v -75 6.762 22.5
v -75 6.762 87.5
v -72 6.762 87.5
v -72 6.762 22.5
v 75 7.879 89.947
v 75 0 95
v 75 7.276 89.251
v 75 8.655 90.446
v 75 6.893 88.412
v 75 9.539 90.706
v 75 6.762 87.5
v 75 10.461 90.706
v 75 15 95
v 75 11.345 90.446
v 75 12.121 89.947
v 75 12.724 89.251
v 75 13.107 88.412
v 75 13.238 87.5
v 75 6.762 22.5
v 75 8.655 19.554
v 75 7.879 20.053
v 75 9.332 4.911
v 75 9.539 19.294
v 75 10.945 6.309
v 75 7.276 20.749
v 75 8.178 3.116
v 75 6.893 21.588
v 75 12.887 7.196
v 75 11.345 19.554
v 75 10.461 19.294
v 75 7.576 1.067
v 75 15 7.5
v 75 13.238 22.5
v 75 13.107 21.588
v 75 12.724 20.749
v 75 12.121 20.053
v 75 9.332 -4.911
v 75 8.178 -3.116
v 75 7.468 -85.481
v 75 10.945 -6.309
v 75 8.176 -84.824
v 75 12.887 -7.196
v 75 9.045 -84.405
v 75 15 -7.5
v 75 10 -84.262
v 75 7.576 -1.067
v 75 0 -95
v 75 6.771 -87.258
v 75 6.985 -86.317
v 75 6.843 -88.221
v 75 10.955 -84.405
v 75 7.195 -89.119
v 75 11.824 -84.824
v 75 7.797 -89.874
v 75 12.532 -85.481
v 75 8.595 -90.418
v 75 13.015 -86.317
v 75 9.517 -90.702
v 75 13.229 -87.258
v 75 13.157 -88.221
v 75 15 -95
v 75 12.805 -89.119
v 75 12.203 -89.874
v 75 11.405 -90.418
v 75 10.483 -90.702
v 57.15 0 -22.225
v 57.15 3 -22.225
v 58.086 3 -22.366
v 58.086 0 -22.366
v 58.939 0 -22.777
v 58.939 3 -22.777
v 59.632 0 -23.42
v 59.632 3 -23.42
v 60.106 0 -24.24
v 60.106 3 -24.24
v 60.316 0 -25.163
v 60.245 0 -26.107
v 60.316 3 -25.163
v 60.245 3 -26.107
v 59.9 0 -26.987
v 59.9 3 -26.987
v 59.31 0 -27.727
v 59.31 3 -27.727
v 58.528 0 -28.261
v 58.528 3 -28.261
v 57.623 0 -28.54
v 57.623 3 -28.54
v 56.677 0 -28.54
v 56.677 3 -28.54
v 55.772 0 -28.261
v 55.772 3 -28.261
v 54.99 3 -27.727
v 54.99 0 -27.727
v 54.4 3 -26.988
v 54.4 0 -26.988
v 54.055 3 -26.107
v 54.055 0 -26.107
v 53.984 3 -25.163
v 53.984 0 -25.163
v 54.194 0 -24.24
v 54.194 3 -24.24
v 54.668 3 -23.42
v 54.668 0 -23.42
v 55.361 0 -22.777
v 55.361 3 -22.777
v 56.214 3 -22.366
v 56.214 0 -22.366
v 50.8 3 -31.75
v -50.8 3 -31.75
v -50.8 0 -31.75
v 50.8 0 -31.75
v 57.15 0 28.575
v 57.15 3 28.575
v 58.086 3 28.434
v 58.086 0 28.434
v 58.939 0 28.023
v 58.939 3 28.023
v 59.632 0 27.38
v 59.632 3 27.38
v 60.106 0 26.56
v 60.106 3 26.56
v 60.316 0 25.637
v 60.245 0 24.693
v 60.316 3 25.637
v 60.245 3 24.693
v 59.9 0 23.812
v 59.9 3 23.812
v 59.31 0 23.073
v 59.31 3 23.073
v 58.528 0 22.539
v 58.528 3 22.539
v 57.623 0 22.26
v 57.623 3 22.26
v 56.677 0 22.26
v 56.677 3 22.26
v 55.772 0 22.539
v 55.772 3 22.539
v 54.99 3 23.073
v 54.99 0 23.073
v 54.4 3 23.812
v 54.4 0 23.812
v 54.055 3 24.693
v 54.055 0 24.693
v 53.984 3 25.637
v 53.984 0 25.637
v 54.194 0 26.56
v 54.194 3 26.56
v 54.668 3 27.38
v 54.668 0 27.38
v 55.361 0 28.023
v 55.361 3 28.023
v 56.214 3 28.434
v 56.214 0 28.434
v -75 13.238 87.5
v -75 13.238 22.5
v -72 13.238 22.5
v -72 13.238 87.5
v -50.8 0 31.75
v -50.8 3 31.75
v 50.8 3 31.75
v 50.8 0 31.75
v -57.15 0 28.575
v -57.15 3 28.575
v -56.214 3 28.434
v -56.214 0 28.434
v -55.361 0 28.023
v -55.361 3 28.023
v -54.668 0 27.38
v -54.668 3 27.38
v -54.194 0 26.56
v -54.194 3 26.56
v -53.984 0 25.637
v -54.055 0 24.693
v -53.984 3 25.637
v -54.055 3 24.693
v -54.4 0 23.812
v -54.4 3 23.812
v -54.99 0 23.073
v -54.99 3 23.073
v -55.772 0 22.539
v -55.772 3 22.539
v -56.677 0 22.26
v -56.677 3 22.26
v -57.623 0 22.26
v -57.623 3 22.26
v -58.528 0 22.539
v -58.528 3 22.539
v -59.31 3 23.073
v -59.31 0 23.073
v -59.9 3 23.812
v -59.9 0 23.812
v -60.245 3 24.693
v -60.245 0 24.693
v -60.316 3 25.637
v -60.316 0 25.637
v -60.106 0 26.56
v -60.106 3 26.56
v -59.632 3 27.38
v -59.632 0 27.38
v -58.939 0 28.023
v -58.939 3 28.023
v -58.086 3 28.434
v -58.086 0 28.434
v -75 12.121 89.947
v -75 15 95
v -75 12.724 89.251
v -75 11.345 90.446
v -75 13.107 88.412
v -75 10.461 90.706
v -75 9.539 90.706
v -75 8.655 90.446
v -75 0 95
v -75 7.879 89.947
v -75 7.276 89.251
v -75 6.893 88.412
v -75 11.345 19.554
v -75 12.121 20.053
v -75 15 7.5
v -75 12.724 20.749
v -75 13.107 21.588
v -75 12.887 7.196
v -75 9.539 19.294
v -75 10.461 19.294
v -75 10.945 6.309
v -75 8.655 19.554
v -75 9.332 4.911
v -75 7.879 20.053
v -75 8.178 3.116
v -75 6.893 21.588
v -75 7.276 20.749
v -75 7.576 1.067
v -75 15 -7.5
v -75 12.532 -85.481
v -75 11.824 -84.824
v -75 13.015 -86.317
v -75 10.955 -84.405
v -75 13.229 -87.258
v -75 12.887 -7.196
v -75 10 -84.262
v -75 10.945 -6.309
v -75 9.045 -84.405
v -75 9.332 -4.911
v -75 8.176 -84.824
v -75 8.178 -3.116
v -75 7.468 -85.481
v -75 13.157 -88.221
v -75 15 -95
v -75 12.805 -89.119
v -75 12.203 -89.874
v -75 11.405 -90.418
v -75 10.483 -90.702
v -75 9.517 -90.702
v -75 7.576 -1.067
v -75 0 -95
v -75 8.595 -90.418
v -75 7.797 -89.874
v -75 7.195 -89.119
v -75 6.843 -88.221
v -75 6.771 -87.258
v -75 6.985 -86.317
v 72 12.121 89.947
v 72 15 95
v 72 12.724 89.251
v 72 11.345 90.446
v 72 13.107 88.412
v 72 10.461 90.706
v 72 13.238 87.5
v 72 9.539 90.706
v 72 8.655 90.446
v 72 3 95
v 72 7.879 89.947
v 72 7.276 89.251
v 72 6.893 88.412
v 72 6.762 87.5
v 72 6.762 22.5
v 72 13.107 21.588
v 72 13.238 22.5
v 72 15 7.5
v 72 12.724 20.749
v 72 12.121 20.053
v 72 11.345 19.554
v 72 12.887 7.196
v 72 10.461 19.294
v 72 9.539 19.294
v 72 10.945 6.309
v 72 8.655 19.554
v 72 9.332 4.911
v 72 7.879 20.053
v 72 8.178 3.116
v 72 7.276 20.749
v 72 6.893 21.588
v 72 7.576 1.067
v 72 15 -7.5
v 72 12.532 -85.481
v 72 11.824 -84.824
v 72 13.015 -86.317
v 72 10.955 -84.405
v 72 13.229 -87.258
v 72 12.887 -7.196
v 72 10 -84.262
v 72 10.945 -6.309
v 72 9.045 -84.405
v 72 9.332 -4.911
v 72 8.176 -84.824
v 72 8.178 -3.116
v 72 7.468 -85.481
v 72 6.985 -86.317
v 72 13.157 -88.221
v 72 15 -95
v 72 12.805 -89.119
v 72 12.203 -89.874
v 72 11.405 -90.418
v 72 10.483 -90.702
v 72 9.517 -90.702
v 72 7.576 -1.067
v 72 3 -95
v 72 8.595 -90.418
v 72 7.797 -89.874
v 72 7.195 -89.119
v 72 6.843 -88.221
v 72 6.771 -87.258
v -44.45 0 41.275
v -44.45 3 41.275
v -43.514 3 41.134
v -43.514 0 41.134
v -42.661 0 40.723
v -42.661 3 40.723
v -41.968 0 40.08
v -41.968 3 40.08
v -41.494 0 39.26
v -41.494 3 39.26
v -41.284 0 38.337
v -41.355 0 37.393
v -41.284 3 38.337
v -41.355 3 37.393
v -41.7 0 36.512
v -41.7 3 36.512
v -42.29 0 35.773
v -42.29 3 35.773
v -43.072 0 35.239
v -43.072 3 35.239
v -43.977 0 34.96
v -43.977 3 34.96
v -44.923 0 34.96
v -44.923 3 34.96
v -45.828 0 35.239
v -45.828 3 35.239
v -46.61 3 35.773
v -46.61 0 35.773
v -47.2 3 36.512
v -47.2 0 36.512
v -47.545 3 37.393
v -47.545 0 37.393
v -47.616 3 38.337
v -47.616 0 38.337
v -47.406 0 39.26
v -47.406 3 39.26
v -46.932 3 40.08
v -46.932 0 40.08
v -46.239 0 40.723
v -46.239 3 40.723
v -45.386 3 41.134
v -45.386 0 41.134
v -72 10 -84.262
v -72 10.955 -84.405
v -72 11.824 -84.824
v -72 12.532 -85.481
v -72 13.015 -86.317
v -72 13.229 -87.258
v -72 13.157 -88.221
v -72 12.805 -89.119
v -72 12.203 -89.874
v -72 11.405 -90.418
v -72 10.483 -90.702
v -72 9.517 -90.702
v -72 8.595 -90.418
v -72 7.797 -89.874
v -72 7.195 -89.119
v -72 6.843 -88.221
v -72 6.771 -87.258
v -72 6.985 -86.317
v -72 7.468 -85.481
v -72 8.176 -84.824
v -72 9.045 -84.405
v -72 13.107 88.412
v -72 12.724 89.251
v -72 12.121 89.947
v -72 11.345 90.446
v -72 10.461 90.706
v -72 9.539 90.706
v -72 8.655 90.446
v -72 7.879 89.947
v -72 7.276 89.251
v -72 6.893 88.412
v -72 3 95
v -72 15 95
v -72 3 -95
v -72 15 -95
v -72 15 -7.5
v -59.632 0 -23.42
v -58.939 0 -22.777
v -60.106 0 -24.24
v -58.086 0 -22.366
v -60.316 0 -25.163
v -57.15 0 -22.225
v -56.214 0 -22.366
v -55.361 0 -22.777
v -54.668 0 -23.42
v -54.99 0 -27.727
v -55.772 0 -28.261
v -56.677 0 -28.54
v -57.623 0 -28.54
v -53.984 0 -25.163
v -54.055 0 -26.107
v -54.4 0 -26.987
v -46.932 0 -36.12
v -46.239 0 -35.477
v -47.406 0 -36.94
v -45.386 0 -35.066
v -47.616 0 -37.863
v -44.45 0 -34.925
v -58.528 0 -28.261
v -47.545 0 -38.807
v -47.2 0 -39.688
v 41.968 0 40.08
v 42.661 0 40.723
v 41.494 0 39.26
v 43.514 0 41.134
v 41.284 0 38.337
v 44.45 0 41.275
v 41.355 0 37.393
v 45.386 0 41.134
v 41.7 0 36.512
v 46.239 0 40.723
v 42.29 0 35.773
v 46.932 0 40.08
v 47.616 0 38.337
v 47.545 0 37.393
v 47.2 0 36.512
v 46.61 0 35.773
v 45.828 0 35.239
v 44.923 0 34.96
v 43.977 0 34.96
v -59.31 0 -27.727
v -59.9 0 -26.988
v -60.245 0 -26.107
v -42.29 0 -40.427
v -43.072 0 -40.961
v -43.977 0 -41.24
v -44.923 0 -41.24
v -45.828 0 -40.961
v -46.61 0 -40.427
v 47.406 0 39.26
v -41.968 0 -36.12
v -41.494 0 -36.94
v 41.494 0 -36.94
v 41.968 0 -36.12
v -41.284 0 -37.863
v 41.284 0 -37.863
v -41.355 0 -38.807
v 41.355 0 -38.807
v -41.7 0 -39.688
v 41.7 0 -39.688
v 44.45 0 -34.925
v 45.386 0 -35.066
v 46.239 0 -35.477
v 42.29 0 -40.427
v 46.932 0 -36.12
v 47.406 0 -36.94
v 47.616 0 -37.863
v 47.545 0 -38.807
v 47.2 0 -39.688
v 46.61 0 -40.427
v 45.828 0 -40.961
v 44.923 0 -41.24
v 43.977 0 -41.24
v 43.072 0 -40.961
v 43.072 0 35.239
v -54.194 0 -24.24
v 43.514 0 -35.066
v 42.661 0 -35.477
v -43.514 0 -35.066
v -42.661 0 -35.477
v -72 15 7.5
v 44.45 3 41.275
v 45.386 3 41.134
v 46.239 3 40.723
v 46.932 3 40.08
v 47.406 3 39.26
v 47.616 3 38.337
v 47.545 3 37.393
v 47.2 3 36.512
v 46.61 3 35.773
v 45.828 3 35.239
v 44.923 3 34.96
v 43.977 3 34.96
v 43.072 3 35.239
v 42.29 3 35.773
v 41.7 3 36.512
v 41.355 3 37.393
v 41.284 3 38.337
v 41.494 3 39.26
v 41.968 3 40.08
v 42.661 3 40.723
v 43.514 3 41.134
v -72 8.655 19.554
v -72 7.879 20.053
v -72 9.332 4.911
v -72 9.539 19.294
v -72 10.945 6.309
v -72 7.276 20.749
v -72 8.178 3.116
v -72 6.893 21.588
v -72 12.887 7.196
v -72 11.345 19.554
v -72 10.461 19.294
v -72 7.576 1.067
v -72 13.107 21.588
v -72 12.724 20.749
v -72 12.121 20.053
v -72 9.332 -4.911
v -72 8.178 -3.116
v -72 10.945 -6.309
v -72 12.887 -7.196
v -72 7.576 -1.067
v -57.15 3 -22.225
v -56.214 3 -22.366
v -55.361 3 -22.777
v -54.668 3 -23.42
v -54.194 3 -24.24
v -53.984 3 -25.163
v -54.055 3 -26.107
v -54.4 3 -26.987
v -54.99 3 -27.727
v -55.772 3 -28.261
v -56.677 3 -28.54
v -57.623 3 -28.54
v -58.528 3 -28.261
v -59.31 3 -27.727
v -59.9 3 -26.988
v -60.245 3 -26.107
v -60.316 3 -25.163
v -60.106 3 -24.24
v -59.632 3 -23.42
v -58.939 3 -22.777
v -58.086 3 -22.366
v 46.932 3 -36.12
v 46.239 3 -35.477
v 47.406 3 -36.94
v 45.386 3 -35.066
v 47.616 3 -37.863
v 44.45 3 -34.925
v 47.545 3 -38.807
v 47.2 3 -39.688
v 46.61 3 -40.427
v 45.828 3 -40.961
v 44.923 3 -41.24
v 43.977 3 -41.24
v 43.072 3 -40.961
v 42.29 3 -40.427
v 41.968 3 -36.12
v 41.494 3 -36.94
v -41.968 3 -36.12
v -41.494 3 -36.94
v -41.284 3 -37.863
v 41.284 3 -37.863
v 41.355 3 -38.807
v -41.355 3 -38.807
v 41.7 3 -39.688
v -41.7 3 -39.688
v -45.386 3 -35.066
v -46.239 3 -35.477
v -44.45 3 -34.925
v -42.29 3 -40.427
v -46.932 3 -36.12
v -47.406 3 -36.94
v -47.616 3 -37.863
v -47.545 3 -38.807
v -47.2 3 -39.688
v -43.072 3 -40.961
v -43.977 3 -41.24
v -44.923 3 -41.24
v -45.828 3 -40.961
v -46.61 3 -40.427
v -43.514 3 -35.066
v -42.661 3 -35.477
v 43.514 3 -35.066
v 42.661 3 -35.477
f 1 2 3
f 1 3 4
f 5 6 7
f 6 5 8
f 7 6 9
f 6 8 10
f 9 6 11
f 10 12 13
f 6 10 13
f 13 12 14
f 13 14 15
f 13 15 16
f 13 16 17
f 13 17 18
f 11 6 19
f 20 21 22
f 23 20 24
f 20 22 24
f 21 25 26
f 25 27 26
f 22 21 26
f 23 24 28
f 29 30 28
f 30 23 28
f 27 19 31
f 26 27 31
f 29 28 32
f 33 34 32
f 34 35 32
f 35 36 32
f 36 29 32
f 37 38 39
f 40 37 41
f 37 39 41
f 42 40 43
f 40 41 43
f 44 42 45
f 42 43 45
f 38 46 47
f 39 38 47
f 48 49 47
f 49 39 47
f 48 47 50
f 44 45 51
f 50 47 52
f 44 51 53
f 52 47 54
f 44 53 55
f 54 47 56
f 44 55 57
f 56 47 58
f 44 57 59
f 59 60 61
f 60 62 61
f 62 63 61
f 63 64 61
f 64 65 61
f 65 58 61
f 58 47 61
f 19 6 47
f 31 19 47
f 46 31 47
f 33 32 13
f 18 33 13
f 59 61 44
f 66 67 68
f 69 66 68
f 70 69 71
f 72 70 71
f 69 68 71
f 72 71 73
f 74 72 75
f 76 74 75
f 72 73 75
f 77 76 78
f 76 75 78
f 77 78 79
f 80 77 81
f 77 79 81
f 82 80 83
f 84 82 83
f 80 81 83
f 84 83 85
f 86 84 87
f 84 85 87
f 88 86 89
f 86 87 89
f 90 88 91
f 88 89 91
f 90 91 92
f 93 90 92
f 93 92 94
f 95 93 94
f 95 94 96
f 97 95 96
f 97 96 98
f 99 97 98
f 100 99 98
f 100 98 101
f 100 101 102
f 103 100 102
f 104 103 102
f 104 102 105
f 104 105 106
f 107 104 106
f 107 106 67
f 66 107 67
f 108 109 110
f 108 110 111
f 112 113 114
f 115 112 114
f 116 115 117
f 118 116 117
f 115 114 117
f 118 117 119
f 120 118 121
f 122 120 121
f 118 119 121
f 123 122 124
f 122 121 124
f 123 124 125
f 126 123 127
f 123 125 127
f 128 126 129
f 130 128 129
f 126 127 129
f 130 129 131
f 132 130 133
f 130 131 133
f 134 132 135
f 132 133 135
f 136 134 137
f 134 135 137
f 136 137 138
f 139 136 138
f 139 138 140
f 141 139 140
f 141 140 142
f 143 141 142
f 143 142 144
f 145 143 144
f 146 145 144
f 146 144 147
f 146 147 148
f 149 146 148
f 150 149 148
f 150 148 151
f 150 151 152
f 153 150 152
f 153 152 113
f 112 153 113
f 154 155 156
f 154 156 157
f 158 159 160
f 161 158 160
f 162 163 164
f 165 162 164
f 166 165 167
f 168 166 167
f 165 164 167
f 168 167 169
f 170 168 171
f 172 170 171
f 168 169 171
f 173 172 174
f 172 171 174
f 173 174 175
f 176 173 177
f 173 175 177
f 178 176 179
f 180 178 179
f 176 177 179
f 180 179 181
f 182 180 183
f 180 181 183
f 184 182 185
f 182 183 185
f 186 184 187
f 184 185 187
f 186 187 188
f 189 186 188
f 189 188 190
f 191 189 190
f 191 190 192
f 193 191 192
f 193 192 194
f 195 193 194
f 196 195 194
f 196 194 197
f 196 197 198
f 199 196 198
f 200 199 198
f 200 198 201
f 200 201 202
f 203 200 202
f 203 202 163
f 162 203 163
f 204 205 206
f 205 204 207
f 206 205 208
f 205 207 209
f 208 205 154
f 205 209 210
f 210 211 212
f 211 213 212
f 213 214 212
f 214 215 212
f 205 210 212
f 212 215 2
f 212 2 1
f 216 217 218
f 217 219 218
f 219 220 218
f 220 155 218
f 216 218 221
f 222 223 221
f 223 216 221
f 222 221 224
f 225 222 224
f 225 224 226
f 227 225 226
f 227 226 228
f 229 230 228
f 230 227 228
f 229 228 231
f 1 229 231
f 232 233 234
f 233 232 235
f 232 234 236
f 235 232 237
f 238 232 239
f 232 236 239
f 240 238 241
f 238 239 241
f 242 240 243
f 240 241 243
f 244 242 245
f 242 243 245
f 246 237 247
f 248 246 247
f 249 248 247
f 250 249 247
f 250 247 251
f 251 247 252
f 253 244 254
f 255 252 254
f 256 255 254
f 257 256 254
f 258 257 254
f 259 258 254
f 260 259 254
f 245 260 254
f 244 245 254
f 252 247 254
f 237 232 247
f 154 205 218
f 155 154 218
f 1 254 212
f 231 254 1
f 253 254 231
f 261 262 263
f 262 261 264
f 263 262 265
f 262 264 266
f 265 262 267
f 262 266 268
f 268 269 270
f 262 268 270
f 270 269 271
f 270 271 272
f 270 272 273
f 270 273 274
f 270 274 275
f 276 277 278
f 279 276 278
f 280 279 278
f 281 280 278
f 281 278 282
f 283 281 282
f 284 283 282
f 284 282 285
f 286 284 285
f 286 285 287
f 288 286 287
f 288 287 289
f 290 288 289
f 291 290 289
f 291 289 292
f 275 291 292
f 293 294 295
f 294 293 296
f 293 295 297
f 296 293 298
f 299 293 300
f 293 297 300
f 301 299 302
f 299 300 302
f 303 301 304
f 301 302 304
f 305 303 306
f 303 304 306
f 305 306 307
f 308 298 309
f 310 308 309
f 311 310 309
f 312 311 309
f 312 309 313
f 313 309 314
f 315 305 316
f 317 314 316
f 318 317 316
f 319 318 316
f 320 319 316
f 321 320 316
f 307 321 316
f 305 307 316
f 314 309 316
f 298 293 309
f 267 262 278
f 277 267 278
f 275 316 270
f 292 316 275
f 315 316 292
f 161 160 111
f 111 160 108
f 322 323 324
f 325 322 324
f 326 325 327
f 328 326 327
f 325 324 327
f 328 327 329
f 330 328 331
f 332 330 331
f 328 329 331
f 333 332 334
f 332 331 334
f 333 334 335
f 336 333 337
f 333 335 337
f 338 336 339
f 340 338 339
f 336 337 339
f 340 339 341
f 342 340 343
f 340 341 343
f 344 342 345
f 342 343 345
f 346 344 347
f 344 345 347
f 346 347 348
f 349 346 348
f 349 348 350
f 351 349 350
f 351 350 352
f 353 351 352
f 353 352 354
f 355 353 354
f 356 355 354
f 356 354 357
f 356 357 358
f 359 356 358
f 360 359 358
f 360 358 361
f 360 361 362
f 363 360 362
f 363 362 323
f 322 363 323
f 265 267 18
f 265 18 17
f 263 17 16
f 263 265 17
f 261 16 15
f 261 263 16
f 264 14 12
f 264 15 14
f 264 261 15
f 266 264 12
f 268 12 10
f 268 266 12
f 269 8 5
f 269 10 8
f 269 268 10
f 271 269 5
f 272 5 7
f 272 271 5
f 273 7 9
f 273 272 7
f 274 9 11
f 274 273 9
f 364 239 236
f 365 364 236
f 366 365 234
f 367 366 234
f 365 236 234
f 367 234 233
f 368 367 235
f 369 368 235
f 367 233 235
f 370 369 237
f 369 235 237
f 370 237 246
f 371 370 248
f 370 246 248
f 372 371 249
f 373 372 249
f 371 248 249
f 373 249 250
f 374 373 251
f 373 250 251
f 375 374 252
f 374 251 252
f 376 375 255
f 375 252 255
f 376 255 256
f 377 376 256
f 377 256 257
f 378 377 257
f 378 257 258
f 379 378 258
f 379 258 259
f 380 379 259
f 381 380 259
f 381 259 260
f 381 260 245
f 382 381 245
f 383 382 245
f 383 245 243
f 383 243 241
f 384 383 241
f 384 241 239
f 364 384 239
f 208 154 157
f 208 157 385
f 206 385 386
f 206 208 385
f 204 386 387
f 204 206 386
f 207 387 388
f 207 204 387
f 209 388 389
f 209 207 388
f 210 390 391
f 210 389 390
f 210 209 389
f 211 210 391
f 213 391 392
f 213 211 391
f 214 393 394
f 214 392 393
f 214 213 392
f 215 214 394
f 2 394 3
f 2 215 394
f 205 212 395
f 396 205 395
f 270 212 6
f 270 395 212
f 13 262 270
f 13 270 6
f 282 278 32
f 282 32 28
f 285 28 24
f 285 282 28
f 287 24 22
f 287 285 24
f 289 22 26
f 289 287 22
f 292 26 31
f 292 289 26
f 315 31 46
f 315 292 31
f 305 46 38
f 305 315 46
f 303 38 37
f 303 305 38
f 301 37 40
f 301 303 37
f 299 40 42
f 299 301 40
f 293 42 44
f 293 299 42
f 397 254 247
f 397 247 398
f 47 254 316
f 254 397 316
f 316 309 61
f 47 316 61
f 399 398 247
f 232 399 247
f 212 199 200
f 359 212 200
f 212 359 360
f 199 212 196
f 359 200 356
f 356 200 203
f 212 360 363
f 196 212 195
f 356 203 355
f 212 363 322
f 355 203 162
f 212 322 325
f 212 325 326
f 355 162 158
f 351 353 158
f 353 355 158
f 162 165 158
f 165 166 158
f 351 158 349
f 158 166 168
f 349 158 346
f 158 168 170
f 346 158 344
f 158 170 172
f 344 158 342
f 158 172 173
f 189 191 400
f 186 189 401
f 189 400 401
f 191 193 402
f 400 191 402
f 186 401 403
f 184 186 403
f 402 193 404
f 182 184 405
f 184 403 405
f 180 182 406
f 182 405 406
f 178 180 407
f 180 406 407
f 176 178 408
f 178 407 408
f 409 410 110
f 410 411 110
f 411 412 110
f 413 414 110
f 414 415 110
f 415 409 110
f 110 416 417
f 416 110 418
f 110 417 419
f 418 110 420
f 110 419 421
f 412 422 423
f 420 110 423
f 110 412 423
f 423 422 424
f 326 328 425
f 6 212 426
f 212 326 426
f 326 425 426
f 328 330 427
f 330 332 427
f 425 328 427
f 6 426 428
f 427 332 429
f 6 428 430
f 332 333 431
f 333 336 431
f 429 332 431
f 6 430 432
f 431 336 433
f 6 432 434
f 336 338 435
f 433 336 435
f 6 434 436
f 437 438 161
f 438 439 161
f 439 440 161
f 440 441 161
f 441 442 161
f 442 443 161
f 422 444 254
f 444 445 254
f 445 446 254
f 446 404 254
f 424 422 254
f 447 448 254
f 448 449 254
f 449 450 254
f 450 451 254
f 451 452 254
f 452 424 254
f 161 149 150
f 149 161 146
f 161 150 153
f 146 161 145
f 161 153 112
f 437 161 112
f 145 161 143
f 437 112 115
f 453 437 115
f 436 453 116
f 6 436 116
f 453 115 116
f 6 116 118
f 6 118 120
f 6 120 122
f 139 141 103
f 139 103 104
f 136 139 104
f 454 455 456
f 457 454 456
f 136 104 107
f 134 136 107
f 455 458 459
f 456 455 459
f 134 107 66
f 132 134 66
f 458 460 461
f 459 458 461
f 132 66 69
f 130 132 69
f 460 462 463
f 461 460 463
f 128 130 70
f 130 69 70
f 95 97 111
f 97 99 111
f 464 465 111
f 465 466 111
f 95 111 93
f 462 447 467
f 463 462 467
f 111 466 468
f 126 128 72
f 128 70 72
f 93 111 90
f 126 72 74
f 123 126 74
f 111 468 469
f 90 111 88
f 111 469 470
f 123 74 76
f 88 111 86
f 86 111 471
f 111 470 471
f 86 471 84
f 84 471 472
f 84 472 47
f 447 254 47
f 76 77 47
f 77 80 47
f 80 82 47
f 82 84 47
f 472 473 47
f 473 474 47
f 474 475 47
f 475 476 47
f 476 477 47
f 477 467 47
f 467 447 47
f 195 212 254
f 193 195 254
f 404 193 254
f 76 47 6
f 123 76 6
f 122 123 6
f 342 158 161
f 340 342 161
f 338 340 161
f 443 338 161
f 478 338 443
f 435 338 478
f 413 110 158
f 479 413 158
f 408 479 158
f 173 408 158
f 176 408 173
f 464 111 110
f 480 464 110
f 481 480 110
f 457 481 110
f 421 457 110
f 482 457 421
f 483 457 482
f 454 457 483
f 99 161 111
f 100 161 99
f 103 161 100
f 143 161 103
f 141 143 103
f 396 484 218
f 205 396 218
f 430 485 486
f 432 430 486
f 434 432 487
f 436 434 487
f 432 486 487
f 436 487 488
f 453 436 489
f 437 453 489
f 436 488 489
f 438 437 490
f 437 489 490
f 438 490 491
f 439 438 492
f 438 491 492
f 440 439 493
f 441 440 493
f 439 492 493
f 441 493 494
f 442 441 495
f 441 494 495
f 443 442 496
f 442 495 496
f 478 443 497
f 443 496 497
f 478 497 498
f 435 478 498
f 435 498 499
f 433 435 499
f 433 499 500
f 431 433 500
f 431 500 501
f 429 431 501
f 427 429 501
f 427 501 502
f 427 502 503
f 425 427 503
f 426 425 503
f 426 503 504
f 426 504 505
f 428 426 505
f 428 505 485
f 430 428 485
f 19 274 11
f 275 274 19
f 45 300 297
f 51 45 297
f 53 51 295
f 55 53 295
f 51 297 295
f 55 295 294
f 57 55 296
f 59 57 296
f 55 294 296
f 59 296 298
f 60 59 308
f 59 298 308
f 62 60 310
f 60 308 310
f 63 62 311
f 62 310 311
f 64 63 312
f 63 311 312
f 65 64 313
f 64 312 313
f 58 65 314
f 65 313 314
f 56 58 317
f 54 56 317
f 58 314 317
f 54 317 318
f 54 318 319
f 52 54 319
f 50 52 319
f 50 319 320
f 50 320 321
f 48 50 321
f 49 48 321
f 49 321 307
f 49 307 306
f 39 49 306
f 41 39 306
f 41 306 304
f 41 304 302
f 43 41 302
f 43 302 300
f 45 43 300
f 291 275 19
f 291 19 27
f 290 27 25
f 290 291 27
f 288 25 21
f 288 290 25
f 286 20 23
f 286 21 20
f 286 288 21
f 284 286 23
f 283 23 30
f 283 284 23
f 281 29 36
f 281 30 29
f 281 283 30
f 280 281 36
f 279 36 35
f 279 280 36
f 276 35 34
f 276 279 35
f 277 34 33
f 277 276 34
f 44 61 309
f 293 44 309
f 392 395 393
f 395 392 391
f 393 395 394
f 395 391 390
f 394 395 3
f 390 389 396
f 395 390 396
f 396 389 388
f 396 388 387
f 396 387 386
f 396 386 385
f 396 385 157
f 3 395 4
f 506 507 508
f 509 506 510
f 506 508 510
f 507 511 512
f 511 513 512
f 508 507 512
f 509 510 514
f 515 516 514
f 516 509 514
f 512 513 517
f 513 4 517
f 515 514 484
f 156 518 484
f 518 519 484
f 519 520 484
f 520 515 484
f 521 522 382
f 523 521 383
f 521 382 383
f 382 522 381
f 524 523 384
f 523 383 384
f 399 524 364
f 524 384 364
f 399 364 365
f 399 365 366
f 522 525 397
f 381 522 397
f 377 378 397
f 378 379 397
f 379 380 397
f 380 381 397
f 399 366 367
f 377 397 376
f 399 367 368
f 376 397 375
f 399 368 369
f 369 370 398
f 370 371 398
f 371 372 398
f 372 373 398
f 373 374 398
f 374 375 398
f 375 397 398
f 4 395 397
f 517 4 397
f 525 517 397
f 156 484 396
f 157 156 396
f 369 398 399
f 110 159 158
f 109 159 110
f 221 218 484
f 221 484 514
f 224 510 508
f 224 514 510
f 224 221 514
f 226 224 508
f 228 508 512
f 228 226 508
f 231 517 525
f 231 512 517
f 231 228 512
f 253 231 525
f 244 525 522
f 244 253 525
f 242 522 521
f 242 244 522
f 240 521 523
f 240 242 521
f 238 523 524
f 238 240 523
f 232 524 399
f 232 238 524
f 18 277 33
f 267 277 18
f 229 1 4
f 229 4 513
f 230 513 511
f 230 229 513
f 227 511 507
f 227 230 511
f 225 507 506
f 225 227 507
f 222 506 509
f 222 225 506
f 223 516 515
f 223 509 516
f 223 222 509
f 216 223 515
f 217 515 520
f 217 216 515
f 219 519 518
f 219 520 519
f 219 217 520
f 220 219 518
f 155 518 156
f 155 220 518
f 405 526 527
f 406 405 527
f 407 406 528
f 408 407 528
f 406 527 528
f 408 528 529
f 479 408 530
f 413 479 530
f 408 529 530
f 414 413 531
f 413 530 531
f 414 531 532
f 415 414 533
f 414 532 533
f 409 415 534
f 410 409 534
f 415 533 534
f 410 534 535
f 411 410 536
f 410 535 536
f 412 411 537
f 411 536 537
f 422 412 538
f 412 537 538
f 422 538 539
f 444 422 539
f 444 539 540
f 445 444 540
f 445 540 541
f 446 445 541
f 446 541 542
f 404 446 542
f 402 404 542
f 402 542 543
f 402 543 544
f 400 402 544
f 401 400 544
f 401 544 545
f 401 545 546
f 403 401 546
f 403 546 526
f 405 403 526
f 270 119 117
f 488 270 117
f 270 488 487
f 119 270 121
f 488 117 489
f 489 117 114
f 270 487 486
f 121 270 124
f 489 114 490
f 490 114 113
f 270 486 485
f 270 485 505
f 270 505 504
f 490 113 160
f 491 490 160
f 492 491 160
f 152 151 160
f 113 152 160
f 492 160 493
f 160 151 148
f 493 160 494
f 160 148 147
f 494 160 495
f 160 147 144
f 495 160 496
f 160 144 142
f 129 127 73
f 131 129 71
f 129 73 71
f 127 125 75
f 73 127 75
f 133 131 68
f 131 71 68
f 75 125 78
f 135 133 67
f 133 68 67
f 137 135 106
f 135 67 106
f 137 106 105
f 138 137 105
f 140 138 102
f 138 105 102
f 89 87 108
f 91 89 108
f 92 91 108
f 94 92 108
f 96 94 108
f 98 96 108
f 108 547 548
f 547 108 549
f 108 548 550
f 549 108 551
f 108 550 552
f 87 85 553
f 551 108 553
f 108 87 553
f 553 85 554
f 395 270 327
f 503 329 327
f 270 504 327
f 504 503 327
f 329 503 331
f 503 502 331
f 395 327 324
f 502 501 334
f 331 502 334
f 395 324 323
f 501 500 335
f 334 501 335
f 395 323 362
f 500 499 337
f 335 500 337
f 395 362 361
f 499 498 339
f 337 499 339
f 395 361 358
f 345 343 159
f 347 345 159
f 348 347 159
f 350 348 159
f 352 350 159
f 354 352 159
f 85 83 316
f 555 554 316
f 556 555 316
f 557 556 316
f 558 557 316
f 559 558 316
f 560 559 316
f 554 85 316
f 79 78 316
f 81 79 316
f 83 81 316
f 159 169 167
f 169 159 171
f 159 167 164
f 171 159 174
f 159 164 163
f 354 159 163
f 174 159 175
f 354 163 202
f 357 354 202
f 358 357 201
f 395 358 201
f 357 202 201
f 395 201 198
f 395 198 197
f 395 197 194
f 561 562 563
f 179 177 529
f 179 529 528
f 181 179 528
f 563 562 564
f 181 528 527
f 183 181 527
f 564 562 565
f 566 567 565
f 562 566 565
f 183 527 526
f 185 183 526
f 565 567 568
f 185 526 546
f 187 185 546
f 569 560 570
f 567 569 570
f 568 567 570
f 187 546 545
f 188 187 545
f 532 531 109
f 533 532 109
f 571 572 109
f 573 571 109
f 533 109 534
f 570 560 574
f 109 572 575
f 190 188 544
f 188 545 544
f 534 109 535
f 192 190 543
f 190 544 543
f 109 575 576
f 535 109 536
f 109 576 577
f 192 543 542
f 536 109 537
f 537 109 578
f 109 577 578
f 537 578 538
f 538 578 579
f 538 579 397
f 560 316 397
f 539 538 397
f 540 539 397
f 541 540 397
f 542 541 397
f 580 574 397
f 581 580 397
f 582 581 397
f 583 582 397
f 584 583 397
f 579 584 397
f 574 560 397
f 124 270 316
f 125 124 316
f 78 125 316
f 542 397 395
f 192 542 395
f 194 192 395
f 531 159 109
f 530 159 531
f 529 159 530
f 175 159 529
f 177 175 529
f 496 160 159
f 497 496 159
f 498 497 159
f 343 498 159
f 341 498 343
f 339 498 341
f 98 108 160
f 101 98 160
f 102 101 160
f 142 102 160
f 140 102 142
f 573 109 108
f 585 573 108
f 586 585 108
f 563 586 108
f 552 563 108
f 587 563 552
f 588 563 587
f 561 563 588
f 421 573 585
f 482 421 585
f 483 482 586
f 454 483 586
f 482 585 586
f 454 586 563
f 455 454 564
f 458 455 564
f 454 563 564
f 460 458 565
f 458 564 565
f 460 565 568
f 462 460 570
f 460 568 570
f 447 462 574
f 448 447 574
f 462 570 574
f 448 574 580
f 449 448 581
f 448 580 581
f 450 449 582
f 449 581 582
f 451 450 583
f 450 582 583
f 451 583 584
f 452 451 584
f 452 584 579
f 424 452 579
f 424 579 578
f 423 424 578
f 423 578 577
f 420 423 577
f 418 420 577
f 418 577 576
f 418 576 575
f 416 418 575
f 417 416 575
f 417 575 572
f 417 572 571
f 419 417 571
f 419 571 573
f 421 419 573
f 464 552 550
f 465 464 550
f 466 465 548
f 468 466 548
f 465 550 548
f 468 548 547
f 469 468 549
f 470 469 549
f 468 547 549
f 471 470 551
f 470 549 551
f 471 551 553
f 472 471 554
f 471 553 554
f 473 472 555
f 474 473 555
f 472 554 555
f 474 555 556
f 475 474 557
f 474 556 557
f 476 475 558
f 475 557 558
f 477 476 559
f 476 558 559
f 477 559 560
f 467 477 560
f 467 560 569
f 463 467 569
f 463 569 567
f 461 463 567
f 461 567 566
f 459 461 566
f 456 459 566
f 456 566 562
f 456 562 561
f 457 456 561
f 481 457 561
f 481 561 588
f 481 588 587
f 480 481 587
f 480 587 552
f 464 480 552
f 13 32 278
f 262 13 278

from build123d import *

# Parameters (mm, degrees)
EXTRUDE_THIN1_DEPTH      = 95
EXTRUDE_THIN1_DEPTH_BACK = 95
SKETCH2_R                = 3.2385
CUT_EXTRUDE1_DEPTH       = 179.185296812
CUT_EXTRUDE2_DEPTH       = 179.185296812
CUT_EXTRUDE2_DEPTH_BACK  = 179.185296812
SKETCH3_R                = 7.5
SKETCH4_R                = 3.175
SKETCH4_W                = 101.6
SKETCH4_H                = 63.5
CUT_EXTRUDE3_DEPTH       = 10


with BuildPart() as part:
    # Sketch1 → Extrude-Thin1 (new, two sides: drawn at the far end of the back side and taken through both)
    with BuildSketch(Plane.XY.offset(-EXTRUDE_THIN1_DEPTH_BACK)):
        Polygon((-75, 15), (-75, 0), (75, 0), (75, 15), (72, 15), (72, 3), (-72, 3), (-72, 15), align=None)
    extrude(amount=EXTRUDE_THIN1_DEPTH + EXTRUDE_THIN1_DEPTH_BACK)

    # Sketch2 → Cut-Extrude1 (cut, through all)
    with BuildSketch(Plane.ZY.offset(75)):
        with Locations((-87.5, 10)):
            Circle(SKETCH2_R)
        with BuildLine():
            Line((87.5, 6.7615), (22.5, 6.7615))
            ThreePointArc((22.5, 6.7615), (19.2615, 10), (22.5, 13.2385))
            Line((22.5, 13.2385), (87.5, 13.2385))
            ThreePointArc((87.5, 13.2385), (90.7385, 10), (87.5, 6.7615))
        make_face()
    extrude(amount=-CUT_EXTRUDE1_DEPTH, mode=Mode.SUBTRACT)

    # Sketch3 → Cut-Extrude2 (cut, two sides: drawn at the far end of the back side and taken through both)
    with BuildSketch(Plane(origin=(75, 0, 0), x_dir=(0, 0, -1), z_dir=(1, 0, 0)).offset(-CUT_EXTRUDE2_DEPTH_BACK)):
        with Locations((0, 15)):
            Circle(SKETCH3_R)
    extrude(amount=CUT_EXTRUDE2_DEPTH + CUT_EXTRUDE2_DEPTH_BACK, mode=Mode.SUBTRACT)

    # Sketch4 → Cut-Extrude3 (cut)
    with BuildSketch(Plane(origin=(0, 3, 0), x_dir=(1, 0, 0), z_dir=(0, 1, 0))):
        with Locations(Location((-44.45, 38.1, 0), (0, 0, 270))):
            Circle(SKETCH4_R)
        with Locations(Location((44.45, 38.1, 0), (0, 0, 270))):
            Circle(SKETCH4_R)
        with Locations(Location((-44.45, -38.1, 0), (0, 0, 270))):
            Circle(SKETCH4_R)
        with Locations(Location((44.45, -38.1, 0), (0, 0, 270))):
            Circle(SKETCH4_R)
        with Locations(Location((-57.15, 25.4, 0), (0, 0, 270))):
            Circle(SKETCH4_R)
        with Locations(Location((57.15, 25.4, 0), (0, 0, 270))):
            Circle(SKETCH4_R)
        with Locations(Location((-57.15, -25.4, 0), (0, 0, 270))):
            Circle(SKETCH4_R)
        with Locations(Location((57.15, -25.4, 0), (0, 0, 270))):
            Circle(SKETCH4_R)
        Rectangle(SKETCH4_W, SKETCH4_H)
    extrude(amount=-CUT_EXTRUDE3_DEPTH, mode=Mode.SUBTRACT)


solid = part.part
